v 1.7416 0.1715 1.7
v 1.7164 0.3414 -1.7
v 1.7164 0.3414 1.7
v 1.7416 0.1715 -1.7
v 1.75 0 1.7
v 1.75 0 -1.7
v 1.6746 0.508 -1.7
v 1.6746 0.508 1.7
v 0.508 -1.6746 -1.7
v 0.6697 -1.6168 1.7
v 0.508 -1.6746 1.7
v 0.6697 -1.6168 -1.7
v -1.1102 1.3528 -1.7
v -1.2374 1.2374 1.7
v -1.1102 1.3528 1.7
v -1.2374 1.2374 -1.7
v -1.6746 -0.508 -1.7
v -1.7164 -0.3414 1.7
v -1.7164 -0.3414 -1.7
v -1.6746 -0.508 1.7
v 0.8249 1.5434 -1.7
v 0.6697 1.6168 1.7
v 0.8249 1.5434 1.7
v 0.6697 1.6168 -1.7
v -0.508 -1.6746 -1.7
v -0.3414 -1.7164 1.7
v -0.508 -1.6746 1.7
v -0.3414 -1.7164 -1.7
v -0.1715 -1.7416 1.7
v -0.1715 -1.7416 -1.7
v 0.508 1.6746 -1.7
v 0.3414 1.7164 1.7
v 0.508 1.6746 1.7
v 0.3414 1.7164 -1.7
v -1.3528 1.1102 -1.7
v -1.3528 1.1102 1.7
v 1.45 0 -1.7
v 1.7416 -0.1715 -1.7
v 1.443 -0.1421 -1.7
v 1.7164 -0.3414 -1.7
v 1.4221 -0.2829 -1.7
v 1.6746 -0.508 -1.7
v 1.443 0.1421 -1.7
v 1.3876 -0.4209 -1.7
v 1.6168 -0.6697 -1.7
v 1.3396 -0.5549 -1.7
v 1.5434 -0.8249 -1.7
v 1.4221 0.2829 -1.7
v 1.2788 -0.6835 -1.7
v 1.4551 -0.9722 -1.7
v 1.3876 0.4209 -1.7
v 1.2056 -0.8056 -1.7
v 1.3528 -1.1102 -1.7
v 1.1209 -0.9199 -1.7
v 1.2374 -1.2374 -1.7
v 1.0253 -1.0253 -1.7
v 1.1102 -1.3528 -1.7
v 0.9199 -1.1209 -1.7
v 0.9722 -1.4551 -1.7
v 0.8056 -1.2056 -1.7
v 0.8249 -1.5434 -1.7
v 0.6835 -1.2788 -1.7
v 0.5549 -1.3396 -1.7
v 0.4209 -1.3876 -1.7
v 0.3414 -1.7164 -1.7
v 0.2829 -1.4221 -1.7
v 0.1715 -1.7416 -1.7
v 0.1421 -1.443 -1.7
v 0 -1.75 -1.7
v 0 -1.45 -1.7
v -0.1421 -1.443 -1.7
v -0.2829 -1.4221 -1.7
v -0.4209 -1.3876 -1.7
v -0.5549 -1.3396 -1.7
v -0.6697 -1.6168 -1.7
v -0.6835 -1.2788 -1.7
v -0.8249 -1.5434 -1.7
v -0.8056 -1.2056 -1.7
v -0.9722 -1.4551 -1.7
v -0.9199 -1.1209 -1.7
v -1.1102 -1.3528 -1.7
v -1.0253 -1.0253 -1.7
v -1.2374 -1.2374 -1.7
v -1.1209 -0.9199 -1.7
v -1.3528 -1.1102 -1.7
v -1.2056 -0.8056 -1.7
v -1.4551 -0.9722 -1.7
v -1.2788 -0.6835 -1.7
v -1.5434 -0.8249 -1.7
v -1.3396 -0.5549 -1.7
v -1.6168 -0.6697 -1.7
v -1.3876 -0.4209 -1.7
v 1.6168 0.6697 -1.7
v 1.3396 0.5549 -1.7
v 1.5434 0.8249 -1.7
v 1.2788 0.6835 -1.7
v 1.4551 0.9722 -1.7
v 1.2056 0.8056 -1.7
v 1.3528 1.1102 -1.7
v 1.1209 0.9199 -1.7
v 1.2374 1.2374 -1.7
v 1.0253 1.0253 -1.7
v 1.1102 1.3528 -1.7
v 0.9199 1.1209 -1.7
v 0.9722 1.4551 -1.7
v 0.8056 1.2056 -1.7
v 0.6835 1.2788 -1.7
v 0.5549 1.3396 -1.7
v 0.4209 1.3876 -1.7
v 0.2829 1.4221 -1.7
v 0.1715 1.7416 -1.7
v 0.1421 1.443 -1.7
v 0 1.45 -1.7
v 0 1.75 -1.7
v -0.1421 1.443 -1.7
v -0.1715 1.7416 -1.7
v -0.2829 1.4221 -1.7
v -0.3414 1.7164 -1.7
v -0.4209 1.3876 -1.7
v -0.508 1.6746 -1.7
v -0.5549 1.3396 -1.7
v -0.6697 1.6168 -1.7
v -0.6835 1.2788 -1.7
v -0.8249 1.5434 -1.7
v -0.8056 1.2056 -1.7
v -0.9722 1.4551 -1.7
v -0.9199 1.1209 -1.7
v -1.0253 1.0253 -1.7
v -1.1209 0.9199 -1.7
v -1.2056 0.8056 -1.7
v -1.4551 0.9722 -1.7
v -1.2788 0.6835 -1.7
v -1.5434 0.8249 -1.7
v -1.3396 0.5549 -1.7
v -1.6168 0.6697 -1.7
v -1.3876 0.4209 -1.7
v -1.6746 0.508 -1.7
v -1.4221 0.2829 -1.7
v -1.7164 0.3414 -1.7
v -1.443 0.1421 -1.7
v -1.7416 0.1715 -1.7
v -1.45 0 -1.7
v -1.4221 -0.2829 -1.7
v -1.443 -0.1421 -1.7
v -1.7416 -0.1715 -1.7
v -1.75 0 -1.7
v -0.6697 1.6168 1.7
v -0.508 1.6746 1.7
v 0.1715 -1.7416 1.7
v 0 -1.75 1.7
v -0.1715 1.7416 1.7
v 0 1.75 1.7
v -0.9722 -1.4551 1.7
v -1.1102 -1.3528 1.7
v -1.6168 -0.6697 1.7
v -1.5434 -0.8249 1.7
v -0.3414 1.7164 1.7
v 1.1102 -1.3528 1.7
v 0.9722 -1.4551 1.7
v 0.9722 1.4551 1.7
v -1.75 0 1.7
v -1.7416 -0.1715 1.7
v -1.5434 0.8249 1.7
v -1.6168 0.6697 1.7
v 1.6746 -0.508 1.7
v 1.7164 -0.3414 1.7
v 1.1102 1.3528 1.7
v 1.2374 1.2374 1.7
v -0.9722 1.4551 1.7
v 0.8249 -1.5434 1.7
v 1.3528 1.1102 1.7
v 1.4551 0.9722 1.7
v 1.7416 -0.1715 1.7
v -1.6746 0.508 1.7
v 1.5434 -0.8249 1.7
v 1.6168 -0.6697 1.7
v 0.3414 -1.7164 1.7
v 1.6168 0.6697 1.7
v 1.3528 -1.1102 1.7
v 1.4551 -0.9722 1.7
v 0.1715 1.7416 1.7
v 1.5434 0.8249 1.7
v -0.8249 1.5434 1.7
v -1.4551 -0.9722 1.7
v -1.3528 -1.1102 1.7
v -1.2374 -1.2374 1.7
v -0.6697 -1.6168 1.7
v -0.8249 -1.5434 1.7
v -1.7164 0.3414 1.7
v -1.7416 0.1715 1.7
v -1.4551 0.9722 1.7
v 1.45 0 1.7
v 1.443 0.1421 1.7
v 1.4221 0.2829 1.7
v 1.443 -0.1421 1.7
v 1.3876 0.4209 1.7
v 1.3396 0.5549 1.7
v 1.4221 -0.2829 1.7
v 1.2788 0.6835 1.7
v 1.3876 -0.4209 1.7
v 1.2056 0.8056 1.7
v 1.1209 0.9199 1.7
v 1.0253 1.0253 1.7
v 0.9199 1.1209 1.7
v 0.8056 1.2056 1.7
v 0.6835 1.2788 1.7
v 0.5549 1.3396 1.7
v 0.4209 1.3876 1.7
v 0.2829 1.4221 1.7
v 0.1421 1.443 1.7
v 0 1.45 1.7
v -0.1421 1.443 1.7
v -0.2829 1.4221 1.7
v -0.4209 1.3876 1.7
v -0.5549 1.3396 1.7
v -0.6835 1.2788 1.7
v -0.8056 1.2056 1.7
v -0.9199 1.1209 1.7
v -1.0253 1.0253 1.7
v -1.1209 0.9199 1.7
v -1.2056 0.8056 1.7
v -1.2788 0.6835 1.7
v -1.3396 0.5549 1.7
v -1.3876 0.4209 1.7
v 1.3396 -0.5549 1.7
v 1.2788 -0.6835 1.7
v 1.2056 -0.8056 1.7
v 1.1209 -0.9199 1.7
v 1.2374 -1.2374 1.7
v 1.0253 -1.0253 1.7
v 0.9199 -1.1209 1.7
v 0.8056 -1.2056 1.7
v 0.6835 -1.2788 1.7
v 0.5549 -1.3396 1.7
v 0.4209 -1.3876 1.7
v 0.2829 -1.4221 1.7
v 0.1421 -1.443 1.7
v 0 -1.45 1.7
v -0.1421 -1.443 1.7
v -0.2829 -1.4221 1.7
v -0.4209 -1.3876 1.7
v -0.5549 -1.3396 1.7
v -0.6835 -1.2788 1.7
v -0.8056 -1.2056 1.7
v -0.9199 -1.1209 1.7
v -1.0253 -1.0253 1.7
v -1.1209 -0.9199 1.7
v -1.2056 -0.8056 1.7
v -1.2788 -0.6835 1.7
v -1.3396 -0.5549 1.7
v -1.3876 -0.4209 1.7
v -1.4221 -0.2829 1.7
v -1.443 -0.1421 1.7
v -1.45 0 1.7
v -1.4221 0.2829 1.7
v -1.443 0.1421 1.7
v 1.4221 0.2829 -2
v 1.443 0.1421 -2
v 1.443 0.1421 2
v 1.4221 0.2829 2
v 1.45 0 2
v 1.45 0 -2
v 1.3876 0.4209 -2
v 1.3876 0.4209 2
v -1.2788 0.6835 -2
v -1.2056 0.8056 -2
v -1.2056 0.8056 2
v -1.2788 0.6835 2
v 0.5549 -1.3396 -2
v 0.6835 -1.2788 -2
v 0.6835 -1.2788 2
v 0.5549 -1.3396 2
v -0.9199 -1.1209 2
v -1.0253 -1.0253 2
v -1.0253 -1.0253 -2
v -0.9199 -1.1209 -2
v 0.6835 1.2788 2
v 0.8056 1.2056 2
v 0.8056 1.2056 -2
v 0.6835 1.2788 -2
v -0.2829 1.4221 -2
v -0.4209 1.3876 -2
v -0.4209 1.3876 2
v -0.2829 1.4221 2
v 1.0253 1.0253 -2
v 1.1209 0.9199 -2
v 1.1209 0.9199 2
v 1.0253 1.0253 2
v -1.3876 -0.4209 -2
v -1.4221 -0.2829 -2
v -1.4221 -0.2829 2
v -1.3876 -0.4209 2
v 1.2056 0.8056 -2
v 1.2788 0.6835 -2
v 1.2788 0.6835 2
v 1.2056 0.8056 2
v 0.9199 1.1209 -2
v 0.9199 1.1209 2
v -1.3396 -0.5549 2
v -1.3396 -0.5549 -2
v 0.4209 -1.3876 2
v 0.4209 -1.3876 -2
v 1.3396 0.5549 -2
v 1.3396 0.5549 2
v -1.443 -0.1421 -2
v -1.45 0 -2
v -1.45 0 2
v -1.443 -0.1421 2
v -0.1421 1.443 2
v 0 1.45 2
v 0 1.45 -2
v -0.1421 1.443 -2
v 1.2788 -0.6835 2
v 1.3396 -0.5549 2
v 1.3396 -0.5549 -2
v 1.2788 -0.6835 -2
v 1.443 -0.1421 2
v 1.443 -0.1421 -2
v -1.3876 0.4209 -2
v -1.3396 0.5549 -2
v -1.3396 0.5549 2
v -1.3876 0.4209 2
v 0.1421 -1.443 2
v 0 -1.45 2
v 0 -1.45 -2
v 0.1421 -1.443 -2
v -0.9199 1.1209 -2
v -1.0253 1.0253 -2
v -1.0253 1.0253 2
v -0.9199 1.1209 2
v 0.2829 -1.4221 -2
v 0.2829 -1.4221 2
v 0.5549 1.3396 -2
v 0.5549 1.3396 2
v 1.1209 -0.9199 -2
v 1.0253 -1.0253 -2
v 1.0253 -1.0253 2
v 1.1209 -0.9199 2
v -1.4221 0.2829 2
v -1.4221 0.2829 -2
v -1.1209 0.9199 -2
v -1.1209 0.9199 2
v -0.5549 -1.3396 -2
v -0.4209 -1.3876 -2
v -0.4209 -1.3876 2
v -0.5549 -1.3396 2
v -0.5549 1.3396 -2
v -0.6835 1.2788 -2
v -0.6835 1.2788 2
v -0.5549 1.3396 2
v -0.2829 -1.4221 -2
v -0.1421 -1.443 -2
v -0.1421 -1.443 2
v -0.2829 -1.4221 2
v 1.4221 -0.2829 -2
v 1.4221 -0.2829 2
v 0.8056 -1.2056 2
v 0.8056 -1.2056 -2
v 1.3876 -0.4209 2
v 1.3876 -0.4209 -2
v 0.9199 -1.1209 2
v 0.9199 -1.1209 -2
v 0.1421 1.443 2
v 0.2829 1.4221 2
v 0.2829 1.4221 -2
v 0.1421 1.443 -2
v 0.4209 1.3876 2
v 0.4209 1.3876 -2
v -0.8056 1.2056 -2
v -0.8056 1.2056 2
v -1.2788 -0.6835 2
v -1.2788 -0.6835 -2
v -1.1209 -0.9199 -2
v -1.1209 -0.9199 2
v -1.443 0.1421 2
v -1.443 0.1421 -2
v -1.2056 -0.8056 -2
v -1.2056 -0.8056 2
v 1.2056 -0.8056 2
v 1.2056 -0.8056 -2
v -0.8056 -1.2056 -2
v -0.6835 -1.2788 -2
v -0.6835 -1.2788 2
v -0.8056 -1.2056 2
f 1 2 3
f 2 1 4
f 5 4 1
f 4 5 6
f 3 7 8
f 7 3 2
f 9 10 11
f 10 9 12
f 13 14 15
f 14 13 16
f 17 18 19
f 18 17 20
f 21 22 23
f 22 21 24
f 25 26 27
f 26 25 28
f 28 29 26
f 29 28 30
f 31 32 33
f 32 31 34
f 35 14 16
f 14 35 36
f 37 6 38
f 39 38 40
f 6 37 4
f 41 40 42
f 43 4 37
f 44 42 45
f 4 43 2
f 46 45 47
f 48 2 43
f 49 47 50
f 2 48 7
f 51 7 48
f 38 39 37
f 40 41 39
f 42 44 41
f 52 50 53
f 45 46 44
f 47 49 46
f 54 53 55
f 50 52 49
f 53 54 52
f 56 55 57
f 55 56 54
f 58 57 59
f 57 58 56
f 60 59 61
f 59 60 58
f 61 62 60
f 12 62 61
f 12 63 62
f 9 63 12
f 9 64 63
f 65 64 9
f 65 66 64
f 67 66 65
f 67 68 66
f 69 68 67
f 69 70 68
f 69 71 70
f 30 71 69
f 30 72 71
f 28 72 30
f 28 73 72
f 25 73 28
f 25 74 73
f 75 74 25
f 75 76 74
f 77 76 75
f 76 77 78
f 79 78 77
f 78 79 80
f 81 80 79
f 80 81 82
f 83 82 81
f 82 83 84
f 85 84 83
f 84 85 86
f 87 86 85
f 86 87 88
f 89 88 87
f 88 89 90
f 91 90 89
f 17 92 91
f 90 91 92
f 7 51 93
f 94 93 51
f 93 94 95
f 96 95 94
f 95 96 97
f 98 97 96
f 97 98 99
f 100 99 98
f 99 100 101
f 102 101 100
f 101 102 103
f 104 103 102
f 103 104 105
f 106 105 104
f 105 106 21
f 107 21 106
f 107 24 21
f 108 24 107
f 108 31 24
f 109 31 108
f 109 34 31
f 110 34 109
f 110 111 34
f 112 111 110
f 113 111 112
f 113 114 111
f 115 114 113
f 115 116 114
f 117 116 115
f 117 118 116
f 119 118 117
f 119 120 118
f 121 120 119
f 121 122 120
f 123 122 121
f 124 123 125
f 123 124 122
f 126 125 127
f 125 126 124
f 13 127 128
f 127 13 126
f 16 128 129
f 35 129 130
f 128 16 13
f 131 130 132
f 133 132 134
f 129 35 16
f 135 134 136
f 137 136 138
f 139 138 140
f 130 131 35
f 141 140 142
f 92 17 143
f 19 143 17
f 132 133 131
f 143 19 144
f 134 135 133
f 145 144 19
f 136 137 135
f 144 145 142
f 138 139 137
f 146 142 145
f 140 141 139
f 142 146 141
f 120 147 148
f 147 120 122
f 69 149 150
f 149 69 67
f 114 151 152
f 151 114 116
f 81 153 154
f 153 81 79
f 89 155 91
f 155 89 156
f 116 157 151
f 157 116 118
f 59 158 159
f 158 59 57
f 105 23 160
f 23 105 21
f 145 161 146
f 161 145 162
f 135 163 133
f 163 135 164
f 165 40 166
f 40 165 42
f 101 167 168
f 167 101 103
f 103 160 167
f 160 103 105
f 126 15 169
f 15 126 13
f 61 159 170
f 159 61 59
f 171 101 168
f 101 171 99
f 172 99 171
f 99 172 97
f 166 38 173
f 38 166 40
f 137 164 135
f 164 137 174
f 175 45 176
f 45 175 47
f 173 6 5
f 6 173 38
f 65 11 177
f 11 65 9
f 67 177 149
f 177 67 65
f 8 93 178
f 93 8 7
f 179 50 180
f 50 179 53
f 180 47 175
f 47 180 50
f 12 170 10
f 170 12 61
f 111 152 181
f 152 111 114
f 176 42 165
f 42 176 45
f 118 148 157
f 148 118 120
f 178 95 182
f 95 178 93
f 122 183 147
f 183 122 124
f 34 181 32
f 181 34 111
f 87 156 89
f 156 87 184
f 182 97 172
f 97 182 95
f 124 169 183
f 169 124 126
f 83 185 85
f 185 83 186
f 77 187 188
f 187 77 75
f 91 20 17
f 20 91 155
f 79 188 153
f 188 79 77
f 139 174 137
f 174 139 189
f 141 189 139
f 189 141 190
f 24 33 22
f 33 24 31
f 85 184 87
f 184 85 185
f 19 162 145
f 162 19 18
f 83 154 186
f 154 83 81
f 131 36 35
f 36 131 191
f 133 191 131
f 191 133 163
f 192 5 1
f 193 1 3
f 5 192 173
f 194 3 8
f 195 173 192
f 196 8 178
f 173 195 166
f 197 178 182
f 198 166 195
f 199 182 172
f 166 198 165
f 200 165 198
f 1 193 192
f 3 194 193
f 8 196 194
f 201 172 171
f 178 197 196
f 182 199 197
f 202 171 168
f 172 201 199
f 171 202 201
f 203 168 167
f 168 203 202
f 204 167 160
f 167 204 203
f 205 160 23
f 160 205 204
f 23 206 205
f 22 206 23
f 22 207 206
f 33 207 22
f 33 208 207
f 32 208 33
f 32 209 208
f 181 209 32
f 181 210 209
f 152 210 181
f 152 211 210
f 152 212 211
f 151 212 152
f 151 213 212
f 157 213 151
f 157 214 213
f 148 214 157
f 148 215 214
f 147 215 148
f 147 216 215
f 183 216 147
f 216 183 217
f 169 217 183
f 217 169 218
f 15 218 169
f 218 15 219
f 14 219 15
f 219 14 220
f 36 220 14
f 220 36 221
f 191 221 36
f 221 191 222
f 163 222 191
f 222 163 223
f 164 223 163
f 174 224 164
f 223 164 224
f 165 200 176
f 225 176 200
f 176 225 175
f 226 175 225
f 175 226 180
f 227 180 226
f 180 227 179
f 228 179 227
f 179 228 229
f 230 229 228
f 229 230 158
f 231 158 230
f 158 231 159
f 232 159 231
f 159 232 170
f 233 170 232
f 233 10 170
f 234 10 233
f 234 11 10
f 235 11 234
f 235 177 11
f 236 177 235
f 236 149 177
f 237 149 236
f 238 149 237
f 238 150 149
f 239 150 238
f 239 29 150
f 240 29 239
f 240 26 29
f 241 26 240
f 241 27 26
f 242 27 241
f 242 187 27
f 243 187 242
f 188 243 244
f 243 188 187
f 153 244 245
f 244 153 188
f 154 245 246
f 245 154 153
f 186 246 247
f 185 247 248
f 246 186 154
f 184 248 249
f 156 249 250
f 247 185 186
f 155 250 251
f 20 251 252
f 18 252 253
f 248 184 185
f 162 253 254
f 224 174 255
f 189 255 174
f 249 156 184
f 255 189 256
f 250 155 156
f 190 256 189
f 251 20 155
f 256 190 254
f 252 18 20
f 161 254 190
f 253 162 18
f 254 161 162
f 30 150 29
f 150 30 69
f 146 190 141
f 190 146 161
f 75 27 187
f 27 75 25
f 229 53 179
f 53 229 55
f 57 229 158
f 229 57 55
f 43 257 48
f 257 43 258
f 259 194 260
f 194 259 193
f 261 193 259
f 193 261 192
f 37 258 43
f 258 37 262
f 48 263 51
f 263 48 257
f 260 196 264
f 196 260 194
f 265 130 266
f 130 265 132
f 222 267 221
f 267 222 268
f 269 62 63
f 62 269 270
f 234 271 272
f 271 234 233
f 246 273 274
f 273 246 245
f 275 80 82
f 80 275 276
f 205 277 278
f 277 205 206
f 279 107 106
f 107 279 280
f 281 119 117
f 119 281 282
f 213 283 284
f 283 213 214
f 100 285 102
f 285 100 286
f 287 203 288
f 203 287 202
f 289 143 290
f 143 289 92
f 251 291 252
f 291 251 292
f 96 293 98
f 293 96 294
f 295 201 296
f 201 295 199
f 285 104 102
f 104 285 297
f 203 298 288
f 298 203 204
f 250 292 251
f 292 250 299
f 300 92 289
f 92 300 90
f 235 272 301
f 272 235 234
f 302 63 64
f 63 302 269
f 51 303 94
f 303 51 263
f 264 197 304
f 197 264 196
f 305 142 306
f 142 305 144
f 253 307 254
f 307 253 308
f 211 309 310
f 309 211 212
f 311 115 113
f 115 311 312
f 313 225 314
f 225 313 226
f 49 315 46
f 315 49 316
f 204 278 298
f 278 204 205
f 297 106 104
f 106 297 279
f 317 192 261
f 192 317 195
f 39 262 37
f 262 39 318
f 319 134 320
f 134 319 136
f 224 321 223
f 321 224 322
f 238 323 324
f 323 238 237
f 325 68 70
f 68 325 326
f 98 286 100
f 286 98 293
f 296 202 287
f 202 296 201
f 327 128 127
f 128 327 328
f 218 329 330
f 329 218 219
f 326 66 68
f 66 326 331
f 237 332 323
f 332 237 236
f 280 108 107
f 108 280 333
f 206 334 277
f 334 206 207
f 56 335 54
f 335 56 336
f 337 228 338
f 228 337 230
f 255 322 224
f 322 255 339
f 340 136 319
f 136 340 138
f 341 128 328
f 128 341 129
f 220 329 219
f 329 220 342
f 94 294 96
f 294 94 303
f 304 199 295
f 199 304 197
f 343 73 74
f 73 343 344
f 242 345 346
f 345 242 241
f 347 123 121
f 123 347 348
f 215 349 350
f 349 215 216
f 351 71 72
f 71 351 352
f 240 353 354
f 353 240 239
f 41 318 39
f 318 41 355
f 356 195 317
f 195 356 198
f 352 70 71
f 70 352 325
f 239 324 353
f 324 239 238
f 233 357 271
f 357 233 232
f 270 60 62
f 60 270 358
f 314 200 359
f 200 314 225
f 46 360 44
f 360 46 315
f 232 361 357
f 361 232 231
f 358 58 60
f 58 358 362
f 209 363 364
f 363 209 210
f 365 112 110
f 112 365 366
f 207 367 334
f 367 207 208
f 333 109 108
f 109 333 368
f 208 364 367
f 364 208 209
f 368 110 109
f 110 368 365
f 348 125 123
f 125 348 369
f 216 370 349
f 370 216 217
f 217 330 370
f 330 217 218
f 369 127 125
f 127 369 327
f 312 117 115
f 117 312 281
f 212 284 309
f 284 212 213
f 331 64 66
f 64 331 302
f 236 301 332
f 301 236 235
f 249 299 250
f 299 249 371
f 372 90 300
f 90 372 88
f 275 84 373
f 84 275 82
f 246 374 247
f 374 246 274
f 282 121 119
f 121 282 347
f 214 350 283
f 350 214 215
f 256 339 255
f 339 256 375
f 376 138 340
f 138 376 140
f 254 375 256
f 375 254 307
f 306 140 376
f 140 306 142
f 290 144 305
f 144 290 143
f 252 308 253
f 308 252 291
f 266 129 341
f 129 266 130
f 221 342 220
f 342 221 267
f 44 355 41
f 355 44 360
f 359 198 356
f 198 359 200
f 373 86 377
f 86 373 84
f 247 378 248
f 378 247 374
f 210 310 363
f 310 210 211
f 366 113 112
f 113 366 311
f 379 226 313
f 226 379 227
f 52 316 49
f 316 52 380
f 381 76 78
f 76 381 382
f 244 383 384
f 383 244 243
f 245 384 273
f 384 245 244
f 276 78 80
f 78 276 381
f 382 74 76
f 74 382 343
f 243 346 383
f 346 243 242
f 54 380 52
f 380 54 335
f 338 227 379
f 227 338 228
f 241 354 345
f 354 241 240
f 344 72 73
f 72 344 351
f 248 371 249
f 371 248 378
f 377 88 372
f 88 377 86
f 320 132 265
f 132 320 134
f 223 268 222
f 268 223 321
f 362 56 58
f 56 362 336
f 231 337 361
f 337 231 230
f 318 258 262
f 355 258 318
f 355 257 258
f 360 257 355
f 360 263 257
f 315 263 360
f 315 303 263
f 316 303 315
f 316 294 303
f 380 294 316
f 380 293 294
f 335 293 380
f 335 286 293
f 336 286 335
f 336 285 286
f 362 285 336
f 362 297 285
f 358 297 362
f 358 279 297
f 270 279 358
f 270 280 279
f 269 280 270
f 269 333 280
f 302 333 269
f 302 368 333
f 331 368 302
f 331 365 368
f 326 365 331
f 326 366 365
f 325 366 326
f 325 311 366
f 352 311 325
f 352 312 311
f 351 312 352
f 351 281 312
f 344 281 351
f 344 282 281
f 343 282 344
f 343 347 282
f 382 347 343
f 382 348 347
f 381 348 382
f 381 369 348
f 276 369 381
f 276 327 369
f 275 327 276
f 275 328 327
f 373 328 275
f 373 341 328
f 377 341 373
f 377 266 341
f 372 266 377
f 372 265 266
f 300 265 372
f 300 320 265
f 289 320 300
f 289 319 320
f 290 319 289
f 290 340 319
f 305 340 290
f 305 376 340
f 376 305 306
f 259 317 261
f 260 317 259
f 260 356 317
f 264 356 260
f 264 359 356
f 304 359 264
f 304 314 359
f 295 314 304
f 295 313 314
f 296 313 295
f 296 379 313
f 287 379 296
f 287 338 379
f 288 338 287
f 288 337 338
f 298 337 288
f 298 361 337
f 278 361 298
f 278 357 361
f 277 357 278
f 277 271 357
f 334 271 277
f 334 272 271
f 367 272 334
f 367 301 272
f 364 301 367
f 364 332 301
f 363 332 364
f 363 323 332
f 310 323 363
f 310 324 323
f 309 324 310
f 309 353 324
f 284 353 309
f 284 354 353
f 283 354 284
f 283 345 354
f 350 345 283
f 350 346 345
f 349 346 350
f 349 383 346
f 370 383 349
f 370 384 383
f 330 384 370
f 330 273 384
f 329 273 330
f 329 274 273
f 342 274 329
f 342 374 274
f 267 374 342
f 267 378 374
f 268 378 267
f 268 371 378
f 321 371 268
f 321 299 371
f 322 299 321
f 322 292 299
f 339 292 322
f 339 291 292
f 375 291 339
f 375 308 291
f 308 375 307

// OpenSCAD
$fn=64;

axial = [3.4, 1.75, 0.3];

module axial_shape(a=[3.4,1.75,0.3]) {
    union() {
        translate([0,0,0]) cylinder(h=a[0], r=a[1], center=true);
        translate([0,0,0]) cylinder(h=a[0] + 2*a[2], r=a[1] - a[2], center=true);
    }
}

axial_shape(axial);
